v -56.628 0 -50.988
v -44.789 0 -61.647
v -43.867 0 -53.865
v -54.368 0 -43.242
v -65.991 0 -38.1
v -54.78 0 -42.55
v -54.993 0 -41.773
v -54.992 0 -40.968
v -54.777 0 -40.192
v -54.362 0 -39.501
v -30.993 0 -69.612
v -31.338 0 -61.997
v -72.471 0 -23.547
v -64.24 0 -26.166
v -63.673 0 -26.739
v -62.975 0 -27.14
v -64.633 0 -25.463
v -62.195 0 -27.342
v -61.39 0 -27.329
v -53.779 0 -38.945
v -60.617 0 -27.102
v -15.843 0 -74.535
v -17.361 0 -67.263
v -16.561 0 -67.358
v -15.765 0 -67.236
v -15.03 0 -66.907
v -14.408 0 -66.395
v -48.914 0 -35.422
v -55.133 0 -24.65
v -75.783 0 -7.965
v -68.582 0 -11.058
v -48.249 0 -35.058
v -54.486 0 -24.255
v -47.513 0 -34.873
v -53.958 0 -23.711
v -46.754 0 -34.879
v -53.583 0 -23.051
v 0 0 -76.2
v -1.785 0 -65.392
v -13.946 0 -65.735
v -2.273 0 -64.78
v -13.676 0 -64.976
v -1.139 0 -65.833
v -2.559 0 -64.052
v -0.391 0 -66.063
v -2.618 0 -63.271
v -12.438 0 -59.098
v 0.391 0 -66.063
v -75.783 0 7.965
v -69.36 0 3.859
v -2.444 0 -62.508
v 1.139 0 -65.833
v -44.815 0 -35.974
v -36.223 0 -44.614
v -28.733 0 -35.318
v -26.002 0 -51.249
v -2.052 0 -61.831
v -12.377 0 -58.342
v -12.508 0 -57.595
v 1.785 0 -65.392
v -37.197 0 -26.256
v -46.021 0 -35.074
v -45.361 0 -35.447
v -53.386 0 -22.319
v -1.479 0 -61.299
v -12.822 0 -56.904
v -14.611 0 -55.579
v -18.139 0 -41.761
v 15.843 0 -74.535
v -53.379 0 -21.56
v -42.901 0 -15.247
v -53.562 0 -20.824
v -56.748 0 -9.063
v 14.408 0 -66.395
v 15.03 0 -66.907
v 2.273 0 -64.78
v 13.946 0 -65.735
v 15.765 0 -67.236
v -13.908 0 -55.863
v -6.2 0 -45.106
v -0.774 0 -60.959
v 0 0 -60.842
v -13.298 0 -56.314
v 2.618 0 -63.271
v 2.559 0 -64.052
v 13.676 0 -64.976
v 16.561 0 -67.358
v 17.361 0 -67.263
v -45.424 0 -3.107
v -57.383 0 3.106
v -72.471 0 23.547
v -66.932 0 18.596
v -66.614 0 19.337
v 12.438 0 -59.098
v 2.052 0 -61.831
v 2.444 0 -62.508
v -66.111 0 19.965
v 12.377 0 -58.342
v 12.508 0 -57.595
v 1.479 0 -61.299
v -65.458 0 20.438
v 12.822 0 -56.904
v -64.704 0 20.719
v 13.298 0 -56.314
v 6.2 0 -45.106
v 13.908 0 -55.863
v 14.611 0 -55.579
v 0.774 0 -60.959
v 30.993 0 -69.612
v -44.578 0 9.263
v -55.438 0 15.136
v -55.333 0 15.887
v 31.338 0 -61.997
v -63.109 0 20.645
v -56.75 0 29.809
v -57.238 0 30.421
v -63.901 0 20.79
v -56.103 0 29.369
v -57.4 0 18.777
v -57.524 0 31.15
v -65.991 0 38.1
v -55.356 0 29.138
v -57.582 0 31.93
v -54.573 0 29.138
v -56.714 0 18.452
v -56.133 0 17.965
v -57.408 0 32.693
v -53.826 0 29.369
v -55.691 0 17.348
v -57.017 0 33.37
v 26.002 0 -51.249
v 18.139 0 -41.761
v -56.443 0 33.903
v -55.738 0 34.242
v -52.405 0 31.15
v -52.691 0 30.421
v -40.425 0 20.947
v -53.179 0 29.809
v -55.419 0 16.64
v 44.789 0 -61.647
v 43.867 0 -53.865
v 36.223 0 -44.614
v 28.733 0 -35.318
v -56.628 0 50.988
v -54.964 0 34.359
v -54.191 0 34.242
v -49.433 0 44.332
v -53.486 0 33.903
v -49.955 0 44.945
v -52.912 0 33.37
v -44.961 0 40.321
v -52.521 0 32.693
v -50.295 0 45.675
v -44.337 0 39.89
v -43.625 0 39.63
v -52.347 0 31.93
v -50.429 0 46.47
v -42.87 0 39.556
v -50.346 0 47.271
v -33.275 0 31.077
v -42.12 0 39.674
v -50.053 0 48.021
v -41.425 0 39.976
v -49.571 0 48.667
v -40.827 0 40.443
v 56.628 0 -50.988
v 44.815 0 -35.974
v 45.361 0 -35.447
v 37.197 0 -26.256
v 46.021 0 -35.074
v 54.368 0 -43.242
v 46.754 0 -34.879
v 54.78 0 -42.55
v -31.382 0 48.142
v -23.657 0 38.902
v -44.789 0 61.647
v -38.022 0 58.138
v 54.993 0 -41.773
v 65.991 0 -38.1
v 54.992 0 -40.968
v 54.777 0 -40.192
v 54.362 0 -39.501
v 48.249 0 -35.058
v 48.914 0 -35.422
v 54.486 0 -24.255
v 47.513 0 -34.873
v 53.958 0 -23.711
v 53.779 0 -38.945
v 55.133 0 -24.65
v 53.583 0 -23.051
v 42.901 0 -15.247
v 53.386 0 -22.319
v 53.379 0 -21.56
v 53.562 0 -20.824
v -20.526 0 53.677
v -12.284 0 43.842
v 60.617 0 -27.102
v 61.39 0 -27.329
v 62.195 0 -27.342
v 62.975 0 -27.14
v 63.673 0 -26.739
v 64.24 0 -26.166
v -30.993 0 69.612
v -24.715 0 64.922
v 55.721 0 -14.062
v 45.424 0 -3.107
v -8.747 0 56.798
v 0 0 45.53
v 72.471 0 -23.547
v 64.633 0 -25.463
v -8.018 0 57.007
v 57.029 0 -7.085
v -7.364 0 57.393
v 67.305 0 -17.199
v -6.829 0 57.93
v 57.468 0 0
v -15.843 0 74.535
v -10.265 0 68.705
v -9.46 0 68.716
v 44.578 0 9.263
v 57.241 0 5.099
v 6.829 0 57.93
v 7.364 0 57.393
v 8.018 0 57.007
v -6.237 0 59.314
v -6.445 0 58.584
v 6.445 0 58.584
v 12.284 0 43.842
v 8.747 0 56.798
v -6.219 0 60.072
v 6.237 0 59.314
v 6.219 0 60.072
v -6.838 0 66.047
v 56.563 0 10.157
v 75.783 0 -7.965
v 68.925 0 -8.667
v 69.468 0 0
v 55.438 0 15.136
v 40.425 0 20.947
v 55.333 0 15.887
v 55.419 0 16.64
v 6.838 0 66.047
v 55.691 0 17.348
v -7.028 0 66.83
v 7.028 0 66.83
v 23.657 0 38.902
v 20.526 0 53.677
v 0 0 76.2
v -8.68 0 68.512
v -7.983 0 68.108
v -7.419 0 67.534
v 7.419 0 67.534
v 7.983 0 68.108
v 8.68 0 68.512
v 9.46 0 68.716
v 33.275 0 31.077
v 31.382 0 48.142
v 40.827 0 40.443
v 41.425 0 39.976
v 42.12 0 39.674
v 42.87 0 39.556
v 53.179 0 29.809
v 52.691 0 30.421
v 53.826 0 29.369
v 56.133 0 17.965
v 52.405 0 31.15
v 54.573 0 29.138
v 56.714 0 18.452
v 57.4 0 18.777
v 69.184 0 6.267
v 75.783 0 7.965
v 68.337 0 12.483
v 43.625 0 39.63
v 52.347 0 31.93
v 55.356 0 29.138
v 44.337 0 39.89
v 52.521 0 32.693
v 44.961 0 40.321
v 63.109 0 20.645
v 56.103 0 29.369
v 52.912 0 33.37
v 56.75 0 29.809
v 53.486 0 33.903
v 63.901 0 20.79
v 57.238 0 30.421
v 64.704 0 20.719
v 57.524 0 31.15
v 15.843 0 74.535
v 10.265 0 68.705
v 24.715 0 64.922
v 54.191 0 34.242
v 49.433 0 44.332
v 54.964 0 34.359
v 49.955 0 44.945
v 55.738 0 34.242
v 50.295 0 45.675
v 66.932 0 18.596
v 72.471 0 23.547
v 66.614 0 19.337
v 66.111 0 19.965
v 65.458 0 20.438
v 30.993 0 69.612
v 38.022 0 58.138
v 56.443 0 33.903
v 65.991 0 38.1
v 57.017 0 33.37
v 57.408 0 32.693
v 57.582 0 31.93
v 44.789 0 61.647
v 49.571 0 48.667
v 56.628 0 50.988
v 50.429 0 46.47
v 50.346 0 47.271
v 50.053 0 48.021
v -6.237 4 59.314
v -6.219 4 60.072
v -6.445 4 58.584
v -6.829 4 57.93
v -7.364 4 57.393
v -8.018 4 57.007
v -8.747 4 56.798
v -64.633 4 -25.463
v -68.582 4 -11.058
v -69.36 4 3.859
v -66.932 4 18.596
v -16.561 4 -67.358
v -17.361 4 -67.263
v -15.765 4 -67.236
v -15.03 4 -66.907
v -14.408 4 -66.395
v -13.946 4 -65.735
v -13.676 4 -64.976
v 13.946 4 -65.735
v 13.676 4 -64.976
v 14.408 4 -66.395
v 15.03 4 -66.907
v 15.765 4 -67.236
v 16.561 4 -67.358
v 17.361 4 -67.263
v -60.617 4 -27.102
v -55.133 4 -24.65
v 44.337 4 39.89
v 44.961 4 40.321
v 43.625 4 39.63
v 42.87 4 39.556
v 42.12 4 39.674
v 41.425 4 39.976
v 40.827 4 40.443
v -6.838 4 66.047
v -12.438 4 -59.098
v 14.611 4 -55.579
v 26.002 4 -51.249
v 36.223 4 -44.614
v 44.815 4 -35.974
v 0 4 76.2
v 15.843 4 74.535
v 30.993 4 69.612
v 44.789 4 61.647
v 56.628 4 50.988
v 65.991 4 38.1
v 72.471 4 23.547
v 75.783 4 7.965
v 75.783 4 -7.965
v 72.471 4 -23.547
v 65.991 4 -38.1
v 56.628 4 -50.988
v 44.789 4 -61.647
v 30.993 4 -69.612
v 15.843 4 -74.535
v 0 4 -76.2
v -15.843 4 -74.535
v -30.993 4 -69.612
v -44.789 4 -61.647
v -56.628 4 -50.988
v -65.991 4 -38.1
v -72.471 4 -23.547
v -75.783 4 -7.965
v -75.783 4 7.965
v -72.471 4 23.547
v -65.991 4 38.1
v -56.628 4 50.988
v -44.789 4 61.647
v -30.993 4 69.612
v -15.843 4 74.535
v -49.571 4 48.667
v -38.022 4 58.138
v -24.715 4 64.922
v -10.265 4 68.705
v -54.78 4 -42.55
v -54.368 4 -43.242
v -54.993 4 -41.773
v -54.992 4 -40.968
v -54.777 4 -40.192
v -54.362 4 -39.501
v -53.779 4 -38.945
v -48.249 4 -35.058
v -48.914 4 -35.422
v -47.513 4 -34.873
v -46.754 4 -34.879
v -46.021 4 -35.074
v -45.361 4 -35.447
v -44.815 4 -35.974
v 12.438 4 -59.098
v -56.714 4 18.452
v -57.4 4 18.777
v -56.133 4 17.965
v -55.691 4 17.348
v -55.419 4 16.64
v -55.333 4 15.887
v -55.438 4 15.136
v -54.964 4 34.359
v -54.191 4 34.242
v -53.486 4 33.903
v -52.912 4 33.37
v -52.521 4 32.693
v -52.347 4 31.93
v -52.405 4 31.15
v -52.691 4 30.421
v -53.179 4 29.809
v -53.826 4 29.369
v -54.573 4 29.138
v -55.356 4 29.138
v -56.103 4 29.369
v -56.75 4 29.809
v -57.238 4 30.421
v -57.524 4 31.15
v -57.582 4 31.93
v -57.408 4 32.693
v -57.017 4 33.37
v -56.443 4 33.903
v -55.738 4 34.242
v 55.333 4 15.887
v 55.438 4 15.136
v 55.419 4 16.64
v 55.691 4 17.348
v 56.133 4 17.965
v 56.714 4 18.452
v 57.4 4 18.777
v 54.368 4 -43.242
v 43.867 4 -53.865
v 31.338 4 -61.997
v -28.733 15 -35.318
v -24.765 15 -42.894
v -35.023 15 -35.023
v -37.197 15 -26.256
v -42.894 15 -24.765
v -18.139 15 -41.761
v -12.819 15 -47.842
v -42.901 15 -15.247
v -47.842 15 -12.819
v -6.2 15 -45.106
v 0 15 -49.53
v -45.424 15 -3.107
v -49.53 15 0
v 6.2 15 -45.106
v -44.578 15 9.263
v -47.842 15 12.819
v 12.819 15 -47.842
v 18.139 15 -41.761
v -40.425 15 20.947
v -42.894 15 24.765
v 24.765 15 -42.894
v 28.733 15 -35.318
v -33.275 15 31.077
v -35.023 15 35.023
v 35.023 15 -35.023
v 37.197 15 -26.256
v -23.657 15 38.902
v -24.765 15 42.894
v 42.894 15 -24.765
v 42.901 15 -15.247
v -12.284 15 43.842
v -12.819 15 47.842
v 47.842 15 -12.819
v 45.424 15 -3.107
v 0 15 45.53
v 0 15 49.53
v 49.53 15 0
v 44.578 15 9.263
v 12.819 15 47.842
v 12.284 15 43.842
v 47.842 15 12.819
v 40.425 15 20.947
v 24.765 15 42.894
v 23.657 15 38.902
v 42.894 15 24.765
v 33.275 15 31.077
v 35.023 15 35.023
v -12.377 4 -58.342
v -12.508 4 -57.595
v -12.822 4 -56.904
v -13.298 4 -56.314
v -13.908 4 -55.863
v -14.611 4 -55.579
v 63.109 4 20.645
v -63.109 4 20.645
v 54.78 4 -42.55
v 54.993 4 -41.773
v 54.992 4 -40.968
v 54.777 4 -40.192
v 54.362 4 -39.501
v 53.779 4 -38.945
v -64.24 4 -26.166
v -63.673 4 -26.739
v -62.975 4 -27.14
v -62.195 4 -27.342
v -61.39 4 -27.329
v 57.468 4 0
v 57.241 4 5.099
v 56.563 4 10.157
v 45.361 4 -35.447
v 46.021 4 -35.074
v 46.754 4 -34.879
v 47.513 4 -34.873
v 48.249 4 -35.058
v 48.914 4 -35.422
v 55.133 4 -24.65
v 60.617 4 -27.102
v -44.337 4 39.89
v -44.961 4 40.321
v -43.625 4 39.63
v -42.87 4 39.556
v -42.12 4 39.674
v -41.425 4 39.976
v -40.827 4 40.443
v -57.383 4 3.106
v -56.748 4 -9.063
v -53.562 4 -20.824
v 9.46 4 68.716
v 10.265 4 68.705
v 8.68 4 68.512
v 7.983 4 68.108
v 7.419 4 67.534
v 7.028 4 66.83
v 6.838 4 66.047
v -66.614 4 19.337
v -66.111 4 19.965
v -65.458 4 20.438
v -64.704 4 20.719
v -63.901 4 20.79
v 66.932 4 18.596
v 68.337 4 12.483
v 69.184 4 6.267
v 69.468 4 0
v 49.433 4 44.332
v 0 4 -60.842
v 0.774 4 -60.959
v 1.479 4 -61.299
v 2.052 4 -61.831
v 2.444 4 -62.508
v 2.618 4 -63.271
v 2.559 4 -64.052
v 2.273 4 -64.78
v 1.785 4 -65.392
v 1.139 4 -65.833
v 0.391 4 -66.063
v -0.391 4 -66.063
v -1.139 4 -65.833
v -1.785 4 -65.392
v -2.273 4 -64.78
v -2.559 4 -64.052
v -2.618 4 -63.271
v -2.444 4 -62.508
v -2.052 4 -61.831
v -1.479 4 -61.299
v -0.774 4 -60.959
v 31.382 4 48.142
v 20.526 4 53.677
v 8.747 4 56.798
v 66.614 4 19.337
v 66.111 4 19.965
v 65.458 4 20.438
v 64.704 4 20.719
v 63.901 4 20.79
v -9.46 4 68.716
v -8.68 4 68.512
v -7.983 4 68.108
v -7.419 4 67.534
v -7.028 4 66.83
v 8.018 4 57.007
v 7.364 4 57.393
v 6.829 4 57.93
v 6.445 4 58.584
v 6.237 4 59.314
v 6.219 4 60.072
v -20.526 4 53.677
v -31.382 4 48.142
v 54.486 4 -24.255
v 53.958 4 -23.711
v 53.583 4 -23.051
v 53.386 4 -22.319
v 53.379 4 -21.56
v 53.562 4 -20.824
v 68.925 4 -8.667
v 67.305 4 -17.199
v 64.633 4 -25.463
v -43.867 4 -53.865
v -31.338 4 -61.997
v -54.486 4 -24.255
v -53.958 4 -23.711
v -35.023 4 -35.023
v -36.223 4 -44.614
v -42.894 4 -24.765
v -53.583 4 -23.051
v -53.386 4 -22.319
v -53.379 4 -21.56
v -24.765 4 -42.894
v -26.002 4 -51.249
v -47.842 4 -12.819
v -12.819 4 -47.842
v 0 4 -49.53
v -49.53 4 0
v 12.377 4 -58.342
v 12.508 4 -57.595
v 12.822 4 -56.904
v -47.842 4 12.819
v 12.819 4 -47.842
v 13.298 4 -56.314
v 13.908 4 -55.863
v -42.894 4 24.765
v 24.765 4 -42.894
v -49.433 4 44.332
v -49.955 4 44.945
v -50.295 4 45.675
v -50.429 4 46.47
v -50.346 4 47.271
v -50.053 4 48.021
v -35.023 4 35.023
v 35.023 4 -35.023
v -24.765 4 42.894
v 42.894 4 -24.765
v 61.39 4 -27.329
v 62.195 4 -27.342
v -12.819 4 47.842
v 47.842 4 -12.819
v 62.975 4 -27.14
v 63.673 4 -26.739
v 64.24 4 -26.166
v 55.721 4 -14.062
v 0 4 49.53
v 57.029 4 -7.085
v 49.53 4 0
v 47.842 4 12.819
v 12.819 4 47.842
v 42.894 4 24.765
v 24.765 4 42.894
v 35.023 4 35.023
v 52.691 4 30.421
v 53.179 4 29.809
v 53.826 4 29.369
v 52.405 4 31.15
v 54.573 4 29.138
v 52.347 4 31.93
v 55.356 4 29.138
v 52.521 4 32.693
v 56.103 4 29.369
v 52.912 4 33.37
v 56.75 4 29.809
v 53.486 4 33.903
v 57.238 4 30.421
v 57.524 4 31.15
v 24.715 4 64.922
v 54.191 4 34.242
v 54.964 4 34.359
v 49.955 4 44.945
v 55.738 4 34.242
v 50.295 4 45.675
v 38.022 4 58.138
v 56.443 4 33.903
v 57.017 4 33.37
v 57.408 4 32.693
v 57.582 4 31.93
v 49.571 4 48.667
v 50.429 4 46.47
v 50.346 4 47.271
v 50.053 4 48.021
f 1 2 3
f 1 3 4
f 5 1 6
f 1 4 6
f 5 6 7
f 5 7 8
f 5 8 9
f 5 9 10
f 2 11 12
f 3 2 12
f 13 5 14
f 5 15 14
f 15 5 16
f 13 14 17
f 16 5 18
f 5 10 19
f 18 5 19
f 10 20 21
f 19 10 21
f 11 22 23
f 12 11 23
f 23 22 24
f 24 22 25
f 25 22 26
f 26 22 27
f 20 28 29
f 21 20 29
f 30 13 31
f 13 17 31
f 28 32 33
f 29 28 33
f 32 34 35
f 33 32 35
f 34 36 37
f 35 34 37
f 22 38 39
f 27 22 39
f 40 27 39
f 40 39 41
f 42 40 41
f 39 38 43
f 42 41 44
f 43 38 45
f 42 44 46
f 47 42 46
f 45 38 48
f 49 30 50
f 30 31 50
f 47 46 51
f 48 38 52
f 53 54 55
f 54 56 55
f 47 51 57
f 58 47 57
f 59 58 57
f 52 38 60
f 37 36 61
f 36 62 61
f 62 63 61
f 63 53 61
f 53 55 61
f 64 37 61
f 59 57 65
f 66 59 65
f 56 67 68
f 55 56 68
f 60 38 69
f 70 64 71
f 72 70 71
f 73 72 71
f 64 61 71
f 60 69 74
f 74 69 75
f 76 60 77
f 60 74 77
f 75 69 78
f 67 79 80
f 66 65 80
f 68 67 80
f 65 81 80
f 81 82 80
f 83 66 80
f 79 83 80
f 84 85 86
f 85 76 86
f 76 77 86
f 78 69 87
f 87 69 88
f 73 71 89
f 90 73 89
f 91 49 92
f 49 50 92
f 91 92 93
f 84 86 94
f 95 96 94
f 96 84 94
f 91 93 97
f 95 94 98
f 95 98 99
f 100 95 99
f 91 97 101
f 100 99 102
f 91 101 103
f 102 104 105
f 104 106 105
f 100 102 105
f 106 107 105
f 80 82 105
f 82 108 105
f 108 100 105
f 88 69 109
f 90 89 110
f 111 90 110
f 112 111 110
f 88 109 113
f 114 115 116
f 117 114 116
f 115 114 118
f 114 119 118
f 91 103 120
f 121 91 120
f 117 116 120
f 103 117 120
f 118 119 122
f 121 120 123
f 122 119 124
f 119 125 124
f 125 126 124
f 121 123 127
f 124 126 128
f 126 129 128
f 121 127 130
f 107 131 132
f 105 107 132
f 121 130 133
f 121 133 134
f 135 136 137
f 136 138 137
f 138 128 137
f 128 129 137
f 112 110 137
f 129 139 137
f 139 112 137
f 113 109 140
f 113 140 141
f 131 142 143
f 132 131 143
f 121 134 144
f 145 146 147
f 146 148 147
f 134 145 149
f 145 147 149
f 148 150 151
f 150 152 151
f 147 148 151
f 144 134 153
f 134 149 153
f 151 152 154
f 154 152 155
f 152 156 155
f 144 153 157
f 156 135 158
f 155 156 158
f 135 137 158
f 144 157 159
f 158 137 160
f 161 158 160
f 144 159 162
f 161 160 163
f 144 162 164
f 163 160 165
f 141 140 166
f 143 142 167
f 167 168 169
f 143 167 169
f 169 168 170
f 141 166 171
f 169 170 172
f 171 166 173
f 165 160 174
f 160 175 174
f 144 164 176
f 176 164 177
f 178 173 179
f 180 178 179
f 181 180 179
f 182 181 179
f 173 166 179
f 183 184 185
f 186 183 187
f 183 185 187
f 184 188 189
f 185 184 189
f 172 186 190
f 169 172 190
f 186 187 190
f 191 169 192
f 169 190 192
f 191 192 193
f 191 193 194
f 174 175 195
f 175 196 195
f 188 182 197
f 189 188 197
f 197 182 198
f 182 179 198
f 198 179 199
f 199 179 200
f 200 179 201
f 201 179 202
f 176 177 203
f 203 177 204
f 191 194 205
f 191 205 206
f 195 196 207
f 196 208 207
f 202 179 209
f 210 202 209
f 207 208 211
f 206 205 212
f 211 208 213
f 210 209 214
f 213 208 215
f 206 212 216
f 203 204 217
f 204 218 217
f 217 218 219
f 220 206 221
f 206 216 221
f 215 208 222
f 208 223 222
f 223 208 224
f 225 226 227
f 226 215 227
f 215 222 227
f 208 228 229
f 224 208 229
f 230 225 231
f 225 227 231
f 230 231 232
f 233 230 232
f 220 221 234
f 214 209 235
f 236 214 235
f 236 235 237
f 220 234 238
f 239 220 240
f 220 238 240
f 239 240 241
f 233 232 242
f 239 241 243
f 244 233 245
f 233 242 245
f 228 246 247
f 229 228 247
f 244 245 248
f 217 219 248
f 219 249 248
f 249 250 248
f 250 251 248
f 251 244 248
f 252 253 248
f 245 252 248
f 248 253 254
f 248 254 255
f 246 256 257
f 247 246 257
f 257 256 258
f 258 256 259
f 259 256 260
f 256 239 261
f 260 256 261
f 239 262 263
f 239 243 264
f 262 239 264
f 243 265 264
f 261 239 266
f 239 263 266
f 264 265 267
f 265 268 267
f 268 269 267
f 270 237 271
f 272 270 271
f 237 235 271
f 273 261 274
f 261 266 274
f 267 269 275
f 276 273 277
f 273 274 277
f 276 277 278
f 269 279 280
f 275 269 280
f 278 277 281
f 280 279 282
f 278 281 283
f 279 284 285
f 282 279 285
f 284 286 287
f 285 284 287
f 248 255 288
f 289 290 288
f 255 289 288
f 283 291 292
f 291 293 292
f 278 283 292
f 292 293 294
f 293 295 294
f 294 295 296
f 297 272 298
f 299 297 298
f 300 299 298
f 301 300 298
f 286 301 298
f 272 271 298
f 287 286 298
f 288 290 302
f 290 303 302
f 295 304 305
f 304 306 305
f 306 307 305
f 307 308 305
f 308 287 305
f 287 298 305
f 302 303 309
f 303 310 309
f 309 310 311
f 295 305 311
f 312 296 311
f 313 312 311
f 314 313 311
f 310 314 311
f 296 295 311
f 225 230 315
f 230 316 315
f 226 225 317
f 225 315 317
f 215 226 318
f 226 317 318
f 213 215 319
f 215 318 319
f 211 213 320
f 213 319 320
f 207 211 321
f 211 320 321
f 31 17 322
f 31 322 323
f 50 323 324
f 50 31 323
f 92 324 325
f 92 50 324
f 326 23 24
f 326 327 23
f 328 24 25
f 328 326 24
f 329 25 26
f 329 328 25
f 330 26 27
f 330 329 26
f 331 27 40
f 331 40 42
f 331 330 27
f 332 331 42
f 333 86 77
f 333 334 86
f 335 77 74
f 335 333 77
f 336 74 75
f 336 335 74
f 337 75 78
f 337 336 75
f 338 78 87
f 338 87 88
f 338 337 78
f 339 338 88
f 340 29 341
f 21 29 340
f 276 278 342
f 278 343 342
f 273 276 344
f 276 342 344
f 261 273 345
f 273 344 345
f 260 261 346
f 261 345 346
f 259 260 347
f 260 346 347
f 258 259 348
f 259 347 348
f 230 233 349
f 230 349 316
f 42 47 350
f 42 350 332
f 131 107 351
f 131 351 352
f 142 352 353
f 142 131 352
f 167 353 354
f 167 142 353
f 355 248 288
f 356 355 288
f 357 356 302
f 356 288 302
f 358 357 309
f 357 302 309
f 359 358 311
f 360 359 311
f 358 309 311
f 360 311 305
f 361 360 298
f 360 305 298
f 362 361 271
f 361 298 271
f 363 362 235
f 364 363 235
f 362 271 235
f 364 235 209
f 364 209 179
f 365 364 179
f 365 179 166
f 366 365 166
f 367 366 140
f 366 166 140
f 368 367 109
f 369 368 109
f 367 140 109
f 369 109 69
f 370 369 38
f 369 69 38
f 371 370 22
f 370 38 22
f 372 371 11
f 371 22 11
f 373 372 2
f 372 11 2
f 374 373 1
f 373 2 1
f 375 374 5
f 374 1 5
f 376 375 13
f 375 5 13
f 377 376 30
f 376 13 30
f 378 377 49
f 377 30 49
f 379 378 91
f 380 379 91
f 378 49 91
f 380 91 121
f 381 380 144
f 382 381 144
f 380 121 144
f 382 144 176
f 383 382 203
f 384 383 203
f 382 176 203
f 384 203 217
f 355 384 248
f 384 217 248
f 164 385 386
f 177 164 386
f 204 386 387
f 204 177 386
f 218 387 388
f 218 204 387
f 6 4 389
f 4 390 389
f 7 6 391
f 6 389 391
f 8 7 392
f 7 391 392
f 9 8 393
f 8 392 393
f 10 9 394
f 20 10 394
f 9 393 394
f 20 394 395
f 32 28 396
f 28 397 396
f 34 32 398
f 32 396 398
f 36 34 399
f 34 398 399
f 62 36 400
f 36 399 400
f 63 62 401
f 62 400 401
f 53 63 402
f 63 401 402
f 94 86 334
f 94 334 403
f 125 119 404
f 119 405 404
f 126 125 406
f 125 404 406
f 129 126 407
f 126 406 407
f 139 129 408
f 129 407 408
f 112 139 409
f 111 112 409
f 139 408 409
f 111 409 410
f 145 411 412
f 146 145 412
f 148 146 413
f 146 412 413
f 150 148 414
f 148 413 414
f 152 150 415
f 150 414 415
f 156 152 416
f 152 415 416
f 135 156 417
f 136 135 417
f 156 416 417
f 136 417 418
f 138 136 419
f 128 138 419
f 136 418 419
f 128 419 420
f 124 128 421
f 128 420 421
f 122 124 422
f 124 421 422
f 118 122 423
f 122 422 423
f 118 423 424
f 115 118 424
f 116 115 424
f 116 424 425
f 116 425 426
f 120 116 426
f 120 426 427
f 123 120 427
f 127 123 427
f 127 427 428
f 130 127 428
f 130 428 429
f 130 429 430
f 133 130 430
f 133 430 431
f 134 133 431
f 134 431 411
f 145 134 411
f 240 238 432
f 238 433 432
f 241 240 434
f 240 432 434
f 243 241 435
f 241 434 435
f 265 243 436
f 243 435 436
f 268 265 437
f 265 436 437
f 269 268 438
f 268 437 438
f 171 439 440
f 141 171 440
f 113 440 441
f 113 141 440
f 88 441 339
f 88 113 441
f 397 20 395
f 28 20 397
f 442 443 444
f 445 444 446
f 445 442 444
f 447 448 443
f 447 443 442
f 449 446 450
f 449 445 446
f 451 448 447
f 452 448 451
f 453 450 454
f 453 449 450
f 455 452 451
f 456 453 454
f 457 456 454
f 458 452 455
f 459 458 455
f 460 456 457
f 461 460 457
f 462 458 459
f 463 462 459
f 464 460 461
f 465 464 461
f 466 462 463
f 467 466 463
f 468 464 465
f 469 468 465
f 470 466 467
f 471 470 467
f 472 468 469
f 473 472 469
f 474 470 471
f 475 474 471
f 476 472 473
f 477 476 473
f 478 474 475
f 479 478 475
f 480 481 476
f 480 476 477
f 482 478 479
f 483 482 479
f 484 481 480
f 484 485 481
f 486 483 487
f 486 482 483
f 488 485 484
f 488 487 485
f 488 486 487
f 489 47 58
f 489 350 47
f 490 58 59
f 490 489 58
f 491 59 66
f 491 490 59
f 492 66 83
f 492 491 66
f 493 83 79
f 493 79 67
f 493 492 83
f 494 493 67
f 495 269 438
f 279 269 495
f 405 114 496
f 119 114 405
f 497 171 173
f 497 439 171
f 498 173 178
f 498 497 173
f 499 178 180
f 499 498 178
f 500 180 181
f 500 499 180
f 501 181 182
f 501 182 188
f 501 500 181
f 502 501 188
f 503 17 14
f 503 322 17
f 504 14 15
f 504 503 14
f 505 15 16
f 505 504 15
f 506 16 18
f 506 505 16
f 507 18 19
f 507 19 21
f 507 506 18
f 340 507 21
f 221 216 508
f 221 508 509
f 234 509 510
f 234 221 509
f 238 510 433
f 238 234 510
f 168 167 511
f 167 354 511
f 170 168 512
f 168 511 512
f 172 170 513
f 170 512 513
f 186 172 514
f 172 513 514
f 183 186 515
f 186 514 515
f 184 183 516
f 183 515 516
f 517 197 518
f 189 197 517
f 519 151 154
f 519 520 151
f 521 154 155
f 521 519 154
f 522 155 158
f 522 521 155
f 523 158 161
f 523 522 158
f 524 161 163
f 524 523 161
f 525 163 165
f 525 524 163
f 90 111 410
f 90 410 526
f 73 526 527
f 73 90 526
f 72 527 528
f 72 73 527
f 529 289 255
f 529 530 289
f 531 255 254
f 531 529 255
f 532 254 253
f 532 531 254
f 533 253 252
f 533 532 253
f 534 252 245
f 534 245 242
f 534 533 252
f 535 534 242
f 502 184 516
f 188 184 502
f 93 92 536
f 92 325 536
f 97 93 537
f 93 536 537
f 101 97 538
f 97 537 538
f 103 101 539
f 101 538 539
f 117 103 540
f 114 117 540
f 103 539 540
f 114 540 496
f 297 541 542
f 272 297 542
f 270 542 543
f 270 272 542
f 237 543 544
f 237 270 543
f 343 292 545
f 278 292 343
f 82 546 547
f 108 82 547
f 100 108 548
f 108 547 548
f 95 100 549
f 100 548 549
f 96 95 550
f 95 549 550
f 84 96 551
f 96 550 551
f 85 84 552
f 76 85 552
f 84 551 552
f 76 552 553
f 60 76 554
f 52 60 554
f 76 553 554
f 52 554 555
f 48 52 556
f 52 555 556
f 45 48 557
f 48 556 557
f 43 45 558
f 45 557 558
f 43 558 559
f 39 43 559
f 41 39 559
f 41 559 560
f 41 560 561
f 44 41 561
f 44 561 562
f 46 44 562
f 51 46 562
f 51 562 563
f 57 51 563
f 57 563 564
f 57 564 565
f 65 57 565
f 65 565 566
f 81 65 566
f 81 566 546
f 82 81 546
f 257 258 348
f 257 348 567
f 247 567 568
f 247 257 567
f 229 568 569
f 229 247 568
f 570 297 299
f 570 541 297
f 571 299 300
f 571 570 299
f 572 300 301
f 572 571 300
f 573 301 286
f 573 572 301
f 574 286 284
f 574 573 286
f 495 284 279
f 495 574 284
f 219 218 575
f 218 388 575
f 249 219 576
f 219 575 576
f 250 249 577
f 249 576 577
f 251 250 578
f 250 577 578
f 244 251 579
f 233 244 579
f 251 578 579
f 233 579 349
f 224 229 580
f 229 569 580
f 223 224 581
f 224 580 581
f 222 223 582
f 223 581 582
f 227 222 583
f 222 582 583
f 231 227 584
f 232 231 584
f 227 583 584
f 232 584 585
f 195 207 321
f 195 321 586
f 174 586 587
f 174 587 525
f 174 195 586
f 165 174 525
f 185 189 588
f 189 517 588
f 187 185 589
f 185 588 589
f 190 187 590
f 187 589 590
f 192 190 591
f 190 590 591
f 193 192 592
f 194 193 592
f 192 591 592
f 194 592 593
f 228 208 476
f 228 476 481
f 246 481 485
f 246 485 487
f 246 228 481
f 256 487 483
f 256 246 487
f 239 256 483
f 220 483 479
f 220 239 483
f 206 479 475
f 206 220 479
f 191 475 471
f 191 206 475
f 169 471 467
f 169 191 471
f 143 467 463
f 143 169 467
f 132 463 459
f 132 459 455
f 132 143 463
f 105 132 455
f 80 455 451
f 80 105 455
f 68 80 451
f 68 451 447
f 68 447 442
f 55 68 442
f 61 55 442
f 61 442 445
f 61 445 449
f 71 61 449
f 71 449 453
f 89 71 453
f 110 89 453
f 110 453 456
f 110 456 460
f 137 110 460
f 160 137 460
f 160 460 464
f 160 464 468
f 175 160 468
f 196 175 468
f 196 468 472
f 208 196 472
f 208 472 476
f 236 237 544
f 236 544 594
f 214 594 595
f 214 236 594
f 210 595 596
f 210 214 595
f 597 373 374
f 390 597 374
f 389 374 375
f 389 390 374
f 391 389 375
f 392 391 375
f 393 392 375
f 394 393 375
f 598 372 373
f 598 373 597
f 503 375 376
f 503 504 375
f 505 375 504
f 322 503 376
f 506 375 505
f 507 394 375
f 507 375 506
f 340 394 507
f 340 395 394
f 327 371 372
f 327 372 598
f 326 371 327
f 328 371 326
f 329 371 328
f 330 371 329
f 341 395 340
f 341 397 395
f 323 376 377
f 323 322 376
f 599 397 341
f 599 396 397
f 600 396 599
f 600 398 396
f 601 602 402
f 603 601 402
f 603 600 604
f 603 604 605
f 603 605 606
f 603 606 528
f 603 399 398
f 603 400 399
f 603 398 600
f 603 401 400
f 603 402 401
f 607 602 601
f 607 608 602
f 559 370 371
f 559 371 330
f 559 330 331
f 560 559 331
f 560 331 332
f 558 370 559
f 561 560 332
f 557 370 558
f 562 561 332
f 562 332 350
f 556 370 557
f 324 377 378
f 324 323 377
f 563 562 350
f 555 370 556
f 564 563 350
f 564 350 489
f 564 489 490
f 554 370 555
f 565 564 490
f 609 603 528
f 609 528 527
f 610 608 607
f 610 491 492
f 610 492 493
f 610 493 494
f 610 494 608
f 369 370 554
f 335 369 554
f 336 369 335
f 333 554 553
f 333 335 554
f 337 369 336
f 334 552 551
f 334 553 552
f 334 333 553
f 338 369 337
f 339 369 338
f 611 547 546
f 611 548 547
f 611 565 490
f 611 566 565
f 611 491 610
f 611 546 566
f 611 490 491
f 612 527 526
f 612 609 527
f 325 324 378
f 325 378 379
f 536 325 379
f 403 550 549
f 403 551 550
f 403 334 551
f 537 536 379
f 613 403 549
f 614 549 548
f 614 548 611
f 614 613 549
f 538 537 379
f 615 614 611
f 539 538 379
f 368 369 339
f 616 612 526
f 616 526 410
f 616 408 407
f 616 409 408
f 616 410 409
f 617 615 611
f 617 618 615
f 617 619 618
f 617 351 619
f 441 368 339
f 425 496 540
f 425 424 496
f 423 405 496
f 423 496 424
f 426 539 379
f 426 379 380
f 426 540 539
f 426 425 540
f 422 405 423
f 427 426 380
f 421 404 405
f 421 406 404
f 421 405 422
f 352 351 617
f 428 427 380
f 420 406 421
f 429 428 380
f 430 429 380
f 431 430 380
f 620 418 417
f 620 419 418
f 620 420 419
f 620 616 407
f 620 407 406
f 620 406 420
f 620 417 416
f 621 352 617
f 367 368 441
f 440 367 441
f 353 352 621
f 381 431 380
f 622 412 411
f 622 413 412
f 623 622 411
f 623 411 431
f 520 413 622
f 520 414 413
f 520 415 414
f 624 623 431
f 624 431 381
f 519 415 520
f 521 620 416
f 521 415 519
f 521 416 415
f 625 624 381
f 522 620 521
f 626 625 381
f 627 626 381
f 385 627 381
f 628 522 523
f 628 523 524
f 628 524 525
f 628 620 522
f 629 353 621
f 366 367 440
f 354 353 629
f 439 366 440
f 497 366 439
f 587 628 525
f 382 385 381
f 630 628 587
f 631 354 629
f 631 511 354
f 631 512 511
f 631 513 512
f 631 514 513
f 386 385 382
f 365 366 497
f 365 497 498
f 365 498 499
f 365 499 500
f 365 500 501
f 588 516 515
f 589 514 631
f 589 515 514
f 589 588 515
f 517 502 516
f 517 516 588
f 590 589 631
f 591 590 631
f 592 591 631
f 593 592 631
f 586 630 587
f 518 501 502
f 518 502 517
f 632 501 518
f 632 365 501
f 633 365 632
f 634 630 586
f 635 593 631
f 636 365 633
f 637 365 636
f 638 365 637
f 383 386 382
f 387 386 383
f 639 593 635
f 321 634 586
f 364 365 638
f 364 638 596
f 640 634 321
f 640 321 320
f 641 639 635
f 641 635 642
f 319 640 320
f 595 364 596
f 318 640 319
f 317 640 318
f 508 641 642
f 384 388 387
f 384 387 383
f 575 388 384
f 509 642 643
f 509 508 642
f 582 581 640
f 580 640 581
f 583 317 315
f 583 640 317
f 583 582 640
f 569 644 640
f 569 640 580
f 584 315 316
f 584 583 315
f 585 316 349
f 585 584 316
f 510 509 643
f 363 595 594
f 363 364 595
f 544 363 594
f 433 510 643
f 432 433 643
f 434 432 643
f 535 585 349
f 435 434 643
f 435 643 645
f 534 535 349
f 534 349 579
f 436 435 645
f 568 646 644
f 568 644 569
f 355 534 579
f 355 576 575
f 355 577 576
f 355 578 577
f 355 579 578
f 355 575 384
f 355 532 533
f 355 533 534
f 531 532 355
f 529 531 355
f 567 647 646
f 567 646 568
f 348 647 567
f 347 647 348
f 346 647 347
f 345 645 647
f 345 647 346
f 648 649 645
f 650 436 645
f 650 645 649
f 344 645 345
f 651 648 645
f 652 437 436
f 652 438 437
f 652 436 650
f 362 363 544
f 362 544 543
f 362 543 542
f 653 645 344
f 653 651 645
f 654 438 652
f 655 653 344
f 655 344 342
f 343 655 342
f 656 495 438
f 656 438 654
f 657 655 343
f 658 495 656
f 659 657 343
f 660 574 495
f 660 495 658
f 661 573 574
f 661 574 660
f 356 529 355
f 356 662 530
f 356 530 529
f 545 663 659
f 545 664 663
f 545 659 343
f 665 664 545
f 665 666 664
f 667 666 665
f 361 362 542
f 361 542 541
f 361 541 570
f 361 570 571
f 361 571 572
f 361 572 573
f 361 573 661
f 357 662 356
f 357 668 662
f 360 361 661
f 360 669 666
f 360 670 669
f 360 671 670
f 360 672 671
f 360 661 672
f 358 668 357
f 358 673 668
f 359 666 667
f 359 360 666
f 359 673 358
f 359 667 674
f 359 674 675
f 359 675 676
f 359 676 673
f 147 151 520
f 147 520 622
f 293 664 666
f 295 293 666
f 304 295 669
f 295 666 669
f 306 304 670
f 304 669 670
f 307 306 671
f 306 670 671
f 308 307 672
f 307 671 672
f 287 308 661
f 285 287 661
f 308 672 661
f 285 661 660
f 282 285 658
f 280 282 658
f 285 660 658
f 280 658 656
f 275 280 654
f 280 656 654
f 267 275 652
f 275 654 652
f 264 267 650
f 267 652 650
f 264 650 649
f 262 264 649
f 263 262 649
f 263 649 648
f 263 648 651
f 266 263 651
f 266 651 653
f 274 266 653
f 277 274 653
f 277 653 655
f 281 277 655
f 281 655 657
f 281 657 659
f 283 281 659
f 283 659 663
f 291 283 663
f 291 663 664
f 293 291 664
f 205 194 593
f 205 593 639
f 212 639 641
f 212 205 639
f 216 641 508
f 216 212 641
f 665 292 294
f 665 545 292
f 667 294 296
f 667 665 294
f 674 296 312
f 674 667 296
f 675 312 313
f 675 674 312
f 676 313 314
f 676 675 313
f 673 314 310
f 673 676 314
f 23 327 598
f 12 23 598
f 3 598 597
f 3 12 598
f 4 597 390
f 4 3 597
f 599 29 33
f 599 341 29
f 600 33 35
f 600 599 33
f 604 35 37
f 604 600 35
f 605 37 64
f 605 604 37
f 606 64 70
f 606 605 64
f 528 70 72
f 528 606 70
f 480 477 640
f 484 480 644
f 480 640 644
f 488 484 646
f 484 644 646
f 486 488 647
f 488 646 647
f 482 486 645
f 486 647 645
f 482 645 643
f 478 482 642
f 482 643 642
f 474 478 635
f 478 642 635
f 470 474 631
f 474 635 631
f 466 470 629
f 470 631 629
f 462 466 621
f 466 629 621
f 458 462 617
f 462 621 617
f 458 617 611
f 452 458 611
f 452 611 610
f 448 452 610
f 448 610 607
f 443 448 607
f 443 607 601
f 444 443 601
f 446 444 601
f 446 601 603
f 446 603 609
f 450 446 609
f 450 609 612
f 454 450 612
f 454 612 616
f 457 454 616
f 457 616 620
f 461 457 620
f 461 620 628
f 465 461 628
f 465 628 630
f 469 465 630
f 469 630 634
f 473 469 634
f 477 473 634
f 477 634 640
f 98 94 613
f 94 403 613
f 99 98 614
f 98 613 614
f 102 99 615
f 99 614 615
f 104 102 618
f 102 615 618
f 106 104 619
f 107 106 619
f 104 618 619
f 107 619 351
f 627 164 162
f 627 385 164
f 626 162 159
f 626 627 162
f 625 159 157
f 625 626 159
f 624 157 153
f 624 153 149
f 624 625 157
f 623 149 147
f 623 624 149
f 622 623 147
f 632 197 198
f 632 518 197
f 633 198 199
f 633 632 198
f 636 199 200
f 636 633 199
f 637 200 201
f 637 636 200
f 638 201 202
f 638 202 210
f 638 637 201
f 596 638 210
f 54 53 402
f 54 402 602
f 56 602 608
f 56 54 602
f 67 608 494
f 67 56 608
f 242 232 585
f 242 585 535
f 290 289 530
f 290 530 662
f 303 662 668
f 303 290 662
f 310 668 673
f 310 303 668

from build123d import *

# Parameters (mm, degrees)
SKETCH1_R               = 76.2
SKETCH1_R_2             = 45.53
BOSS_EXTRUDE1_DEPTH     = 4
CUT_EXTRUDE1_DEPTH      = 108.837284832
CUT_EXTRUDE1_DEPTH_BACK = 108.837284832
SKETCH10_R              = 2.625
CUT_EXTRUDE5_DEPTH      = 6
FILLET1_R               = 3
SKETCH1_12_R            = 49.53
SKETCH1_12_R_2          = 45.53
BOSS_EXTRUDE2_DEPTH     = 15


with BuildPart() as part:
    # Sketch1 → Boss-Extrude1 (new body)
    with BuildSketch(Plane(origin=(0, 0, 0), x_dir=(1, 0, 0), z_dir=(0, 1, 0))):
        Circle(SKETCH1_R)
        Circle(SKETCH1_R_2, mode=Mode.SUBTRACT)
    extrude(amount=BOSS_EXTRUDE1_DEPTH)

    # Sketch1<7> → Cut-Extrude1 (cut, two sides: drawn at the far end of the back side and taken through both)
    with BuildSketch(Plane(origin=(0, 0, 0), x_dir=(1, 0, 0), z_dir=(0, 1, 0)).offset(-CUT_EXTRUDE1_DEPTH_BACK)):
        with BuildLine():
            Line((-11.835953591, 56.235431525), (-14.307462584, 67.978158777))
            ThreePointArc((-14.307462584, 67.978158777), (-37.821938213, 58.268641189), (-56.263908611, 40.744400156))
            Line((-56.263908611, 40.744400156), (-46.544731969, 33.706104523))
            ThreePointArc((-46.544731969, 33.706104523), (-31.288476399, 48.203161731), (-11.835953591, 56.235431525))
        make_face()
        with BuildLine():
            ThreePointArc((56.263908611, 40.744400156), (37.821938213, 58.268641189), (14.307462584, 67.978158777))
            Line((14.307462584, 67.978158777), (11.835953591, 56.235431525))
            ThreePointArc((11.835953591, 56.235431525), (31.288476399, 48.203161731), (46.544731969, 33.706104523))
            Line((46.544731969, 33.706104523), (56.263908611, 40.744400156))
        make_face()
        with BuildLine():
            Line((-52.462708765, 23.455868036), (-63.417639903, 28.353774095))
            ThreePointArc((-63.417639903, 28.353774095), (-69.373092621, 3.620438719), (-66.024543695, -21.598453327))
            Line((-66.024543695, -21.598453327), (-54.619289089, -17.867479275))
            ThreePointArc((-54.619289089, -17.867479275), (-57.389400801, 2.995034542), (-52.462708765, 23.455868036))
        make_face()
        with BuildLine():
            ThreePointArc((66.024543695, -21.598453327), (69.373092621, 3.620438719), (63.417639903, 28.353774095))
            Line((63.417639903, 28.353774095), (52.462708765, 23.455868036))
            ThreePointArc((52.462708765, 23.455868036), (57.389400801, 2.995034542), (54.619289089, -17.867479275))
            Line((54.619289089, -17.867479275), (66.024543695, -21.598453327))
        make_face()
        with BuildLine():
            Line((-42.783335499, -38.36795225), (-51.717081111, -46.37970545))
            ThreePointArc((-51.717081111, -46.37970545), (-31.551154407, -61.889079908), (-7.153731292, -69.098174251))
            Line((-7.153731292, -69.098174251), (-5.917976795, -57.16197256))
            ThreePointArc((-5.917976795, -57.16197256), (-26.100924402, -51.198196273), (-42.783335499, -38.36795225))
        make_face()
        with BuildLine():
            ThreePointArc((7.153731292, -69.098174251), (31.551154407, -61.889079908), (51.717081111, -46.37970545))
            Line((51.717081111, -46.37970545), (42.783335499, -38.36795225))
            ThreePointArc((42.783335499, -38.36795225), (26.100924402, -51.198196273), (5.917976795, -57.16197256))
            Line((5.917976795, -57.16197256), (7.153731292, -69.098174251))
        make_face()
    extrude(amount=CUT_EXTRUDE1_DEPTH + CUT_EXTRUDE1_DEPTH_BACK, mode=Mode.SUBTRACT)

    # Sketch10 → Cut-Extrude5 (cut)
    with BuildSketch(Plane(origin=(0, 4, 0), x_dir=(1, 0, 0), z_dir=(0, 1, 0))):
        with Locations((0, 63.4675)):
            Circle(SKETCH10_R)
        with Locations((54.964467315, -31.73375)):
            Circle(SKETCH10_R)
        with Locations((-54.964467315, -31.73375)):
            Circle(SKETCH10_R)
    extrude(amount=-CUT_EXTRUDE5_DEPTH, mode=Mode.SUBTRACT)

    # Fillet1
    fillet1_edges = [part.edges().sort_by_distance(p)[0] for p in [
        (-14.307462584, 2, -67.978158777),
        (-56.263908611, 2, -40.744400156),
        (-51.717081111, 2, 46.37970545),
        (11.835953591, 2, -56.235431525),
        (46.544731969, 2, -33.706104523),
        (7.153731292, 2, 69.098174251),
        (54.619289089, 2, 17.867479275),
        (-66.024543695, 2, 21.598453327),
        (66.024543695, 2, 21.598453327),
        (-7.153731292, 2, 69.098174251),
        (-46.544731969, 2, -33.706104523),
        (56.263908611, 2, -40.744400156),
        (-11.835953591, 2, -56.235431525),
        (-54.619289089, 2, 17.867479275),
        (-52.462708765, 2, -23.455868036),
        (51.717081111, 2, 46.37970545),
        (-5.917976795, 2, 57.16197256),
        (63.417639903, 2, -28.353774095),
        (-42.783335499, 2, 38.36795225),
        (42.783335499, 2, 38.36795225),
        (-63.417639903, 2, -28.353774095),
        (5.917976795, 2, 57.16197256),
        (52.462708765, 2, -23.455868036),
        (14.307462584, 2, -67.978158777),
    ]]
    fillet(fillet1_edges, radius=FILLET1_R)

    # Sketch1<12> → Boss-Extrude2 (add)
    with BuildSketch(Plane(origin=(0, 0, 0), x_dir=(1, 0, 0), z_dir=(0, 1, 0))):
        Circle(SKETCH1_12_R)
        Circle(SKETCH1_12_R_2, mode=Mode.SUBTRACT)
    extrude(amount=BOSS_EXTRUDE2_DEPTH)


solid = part.part
